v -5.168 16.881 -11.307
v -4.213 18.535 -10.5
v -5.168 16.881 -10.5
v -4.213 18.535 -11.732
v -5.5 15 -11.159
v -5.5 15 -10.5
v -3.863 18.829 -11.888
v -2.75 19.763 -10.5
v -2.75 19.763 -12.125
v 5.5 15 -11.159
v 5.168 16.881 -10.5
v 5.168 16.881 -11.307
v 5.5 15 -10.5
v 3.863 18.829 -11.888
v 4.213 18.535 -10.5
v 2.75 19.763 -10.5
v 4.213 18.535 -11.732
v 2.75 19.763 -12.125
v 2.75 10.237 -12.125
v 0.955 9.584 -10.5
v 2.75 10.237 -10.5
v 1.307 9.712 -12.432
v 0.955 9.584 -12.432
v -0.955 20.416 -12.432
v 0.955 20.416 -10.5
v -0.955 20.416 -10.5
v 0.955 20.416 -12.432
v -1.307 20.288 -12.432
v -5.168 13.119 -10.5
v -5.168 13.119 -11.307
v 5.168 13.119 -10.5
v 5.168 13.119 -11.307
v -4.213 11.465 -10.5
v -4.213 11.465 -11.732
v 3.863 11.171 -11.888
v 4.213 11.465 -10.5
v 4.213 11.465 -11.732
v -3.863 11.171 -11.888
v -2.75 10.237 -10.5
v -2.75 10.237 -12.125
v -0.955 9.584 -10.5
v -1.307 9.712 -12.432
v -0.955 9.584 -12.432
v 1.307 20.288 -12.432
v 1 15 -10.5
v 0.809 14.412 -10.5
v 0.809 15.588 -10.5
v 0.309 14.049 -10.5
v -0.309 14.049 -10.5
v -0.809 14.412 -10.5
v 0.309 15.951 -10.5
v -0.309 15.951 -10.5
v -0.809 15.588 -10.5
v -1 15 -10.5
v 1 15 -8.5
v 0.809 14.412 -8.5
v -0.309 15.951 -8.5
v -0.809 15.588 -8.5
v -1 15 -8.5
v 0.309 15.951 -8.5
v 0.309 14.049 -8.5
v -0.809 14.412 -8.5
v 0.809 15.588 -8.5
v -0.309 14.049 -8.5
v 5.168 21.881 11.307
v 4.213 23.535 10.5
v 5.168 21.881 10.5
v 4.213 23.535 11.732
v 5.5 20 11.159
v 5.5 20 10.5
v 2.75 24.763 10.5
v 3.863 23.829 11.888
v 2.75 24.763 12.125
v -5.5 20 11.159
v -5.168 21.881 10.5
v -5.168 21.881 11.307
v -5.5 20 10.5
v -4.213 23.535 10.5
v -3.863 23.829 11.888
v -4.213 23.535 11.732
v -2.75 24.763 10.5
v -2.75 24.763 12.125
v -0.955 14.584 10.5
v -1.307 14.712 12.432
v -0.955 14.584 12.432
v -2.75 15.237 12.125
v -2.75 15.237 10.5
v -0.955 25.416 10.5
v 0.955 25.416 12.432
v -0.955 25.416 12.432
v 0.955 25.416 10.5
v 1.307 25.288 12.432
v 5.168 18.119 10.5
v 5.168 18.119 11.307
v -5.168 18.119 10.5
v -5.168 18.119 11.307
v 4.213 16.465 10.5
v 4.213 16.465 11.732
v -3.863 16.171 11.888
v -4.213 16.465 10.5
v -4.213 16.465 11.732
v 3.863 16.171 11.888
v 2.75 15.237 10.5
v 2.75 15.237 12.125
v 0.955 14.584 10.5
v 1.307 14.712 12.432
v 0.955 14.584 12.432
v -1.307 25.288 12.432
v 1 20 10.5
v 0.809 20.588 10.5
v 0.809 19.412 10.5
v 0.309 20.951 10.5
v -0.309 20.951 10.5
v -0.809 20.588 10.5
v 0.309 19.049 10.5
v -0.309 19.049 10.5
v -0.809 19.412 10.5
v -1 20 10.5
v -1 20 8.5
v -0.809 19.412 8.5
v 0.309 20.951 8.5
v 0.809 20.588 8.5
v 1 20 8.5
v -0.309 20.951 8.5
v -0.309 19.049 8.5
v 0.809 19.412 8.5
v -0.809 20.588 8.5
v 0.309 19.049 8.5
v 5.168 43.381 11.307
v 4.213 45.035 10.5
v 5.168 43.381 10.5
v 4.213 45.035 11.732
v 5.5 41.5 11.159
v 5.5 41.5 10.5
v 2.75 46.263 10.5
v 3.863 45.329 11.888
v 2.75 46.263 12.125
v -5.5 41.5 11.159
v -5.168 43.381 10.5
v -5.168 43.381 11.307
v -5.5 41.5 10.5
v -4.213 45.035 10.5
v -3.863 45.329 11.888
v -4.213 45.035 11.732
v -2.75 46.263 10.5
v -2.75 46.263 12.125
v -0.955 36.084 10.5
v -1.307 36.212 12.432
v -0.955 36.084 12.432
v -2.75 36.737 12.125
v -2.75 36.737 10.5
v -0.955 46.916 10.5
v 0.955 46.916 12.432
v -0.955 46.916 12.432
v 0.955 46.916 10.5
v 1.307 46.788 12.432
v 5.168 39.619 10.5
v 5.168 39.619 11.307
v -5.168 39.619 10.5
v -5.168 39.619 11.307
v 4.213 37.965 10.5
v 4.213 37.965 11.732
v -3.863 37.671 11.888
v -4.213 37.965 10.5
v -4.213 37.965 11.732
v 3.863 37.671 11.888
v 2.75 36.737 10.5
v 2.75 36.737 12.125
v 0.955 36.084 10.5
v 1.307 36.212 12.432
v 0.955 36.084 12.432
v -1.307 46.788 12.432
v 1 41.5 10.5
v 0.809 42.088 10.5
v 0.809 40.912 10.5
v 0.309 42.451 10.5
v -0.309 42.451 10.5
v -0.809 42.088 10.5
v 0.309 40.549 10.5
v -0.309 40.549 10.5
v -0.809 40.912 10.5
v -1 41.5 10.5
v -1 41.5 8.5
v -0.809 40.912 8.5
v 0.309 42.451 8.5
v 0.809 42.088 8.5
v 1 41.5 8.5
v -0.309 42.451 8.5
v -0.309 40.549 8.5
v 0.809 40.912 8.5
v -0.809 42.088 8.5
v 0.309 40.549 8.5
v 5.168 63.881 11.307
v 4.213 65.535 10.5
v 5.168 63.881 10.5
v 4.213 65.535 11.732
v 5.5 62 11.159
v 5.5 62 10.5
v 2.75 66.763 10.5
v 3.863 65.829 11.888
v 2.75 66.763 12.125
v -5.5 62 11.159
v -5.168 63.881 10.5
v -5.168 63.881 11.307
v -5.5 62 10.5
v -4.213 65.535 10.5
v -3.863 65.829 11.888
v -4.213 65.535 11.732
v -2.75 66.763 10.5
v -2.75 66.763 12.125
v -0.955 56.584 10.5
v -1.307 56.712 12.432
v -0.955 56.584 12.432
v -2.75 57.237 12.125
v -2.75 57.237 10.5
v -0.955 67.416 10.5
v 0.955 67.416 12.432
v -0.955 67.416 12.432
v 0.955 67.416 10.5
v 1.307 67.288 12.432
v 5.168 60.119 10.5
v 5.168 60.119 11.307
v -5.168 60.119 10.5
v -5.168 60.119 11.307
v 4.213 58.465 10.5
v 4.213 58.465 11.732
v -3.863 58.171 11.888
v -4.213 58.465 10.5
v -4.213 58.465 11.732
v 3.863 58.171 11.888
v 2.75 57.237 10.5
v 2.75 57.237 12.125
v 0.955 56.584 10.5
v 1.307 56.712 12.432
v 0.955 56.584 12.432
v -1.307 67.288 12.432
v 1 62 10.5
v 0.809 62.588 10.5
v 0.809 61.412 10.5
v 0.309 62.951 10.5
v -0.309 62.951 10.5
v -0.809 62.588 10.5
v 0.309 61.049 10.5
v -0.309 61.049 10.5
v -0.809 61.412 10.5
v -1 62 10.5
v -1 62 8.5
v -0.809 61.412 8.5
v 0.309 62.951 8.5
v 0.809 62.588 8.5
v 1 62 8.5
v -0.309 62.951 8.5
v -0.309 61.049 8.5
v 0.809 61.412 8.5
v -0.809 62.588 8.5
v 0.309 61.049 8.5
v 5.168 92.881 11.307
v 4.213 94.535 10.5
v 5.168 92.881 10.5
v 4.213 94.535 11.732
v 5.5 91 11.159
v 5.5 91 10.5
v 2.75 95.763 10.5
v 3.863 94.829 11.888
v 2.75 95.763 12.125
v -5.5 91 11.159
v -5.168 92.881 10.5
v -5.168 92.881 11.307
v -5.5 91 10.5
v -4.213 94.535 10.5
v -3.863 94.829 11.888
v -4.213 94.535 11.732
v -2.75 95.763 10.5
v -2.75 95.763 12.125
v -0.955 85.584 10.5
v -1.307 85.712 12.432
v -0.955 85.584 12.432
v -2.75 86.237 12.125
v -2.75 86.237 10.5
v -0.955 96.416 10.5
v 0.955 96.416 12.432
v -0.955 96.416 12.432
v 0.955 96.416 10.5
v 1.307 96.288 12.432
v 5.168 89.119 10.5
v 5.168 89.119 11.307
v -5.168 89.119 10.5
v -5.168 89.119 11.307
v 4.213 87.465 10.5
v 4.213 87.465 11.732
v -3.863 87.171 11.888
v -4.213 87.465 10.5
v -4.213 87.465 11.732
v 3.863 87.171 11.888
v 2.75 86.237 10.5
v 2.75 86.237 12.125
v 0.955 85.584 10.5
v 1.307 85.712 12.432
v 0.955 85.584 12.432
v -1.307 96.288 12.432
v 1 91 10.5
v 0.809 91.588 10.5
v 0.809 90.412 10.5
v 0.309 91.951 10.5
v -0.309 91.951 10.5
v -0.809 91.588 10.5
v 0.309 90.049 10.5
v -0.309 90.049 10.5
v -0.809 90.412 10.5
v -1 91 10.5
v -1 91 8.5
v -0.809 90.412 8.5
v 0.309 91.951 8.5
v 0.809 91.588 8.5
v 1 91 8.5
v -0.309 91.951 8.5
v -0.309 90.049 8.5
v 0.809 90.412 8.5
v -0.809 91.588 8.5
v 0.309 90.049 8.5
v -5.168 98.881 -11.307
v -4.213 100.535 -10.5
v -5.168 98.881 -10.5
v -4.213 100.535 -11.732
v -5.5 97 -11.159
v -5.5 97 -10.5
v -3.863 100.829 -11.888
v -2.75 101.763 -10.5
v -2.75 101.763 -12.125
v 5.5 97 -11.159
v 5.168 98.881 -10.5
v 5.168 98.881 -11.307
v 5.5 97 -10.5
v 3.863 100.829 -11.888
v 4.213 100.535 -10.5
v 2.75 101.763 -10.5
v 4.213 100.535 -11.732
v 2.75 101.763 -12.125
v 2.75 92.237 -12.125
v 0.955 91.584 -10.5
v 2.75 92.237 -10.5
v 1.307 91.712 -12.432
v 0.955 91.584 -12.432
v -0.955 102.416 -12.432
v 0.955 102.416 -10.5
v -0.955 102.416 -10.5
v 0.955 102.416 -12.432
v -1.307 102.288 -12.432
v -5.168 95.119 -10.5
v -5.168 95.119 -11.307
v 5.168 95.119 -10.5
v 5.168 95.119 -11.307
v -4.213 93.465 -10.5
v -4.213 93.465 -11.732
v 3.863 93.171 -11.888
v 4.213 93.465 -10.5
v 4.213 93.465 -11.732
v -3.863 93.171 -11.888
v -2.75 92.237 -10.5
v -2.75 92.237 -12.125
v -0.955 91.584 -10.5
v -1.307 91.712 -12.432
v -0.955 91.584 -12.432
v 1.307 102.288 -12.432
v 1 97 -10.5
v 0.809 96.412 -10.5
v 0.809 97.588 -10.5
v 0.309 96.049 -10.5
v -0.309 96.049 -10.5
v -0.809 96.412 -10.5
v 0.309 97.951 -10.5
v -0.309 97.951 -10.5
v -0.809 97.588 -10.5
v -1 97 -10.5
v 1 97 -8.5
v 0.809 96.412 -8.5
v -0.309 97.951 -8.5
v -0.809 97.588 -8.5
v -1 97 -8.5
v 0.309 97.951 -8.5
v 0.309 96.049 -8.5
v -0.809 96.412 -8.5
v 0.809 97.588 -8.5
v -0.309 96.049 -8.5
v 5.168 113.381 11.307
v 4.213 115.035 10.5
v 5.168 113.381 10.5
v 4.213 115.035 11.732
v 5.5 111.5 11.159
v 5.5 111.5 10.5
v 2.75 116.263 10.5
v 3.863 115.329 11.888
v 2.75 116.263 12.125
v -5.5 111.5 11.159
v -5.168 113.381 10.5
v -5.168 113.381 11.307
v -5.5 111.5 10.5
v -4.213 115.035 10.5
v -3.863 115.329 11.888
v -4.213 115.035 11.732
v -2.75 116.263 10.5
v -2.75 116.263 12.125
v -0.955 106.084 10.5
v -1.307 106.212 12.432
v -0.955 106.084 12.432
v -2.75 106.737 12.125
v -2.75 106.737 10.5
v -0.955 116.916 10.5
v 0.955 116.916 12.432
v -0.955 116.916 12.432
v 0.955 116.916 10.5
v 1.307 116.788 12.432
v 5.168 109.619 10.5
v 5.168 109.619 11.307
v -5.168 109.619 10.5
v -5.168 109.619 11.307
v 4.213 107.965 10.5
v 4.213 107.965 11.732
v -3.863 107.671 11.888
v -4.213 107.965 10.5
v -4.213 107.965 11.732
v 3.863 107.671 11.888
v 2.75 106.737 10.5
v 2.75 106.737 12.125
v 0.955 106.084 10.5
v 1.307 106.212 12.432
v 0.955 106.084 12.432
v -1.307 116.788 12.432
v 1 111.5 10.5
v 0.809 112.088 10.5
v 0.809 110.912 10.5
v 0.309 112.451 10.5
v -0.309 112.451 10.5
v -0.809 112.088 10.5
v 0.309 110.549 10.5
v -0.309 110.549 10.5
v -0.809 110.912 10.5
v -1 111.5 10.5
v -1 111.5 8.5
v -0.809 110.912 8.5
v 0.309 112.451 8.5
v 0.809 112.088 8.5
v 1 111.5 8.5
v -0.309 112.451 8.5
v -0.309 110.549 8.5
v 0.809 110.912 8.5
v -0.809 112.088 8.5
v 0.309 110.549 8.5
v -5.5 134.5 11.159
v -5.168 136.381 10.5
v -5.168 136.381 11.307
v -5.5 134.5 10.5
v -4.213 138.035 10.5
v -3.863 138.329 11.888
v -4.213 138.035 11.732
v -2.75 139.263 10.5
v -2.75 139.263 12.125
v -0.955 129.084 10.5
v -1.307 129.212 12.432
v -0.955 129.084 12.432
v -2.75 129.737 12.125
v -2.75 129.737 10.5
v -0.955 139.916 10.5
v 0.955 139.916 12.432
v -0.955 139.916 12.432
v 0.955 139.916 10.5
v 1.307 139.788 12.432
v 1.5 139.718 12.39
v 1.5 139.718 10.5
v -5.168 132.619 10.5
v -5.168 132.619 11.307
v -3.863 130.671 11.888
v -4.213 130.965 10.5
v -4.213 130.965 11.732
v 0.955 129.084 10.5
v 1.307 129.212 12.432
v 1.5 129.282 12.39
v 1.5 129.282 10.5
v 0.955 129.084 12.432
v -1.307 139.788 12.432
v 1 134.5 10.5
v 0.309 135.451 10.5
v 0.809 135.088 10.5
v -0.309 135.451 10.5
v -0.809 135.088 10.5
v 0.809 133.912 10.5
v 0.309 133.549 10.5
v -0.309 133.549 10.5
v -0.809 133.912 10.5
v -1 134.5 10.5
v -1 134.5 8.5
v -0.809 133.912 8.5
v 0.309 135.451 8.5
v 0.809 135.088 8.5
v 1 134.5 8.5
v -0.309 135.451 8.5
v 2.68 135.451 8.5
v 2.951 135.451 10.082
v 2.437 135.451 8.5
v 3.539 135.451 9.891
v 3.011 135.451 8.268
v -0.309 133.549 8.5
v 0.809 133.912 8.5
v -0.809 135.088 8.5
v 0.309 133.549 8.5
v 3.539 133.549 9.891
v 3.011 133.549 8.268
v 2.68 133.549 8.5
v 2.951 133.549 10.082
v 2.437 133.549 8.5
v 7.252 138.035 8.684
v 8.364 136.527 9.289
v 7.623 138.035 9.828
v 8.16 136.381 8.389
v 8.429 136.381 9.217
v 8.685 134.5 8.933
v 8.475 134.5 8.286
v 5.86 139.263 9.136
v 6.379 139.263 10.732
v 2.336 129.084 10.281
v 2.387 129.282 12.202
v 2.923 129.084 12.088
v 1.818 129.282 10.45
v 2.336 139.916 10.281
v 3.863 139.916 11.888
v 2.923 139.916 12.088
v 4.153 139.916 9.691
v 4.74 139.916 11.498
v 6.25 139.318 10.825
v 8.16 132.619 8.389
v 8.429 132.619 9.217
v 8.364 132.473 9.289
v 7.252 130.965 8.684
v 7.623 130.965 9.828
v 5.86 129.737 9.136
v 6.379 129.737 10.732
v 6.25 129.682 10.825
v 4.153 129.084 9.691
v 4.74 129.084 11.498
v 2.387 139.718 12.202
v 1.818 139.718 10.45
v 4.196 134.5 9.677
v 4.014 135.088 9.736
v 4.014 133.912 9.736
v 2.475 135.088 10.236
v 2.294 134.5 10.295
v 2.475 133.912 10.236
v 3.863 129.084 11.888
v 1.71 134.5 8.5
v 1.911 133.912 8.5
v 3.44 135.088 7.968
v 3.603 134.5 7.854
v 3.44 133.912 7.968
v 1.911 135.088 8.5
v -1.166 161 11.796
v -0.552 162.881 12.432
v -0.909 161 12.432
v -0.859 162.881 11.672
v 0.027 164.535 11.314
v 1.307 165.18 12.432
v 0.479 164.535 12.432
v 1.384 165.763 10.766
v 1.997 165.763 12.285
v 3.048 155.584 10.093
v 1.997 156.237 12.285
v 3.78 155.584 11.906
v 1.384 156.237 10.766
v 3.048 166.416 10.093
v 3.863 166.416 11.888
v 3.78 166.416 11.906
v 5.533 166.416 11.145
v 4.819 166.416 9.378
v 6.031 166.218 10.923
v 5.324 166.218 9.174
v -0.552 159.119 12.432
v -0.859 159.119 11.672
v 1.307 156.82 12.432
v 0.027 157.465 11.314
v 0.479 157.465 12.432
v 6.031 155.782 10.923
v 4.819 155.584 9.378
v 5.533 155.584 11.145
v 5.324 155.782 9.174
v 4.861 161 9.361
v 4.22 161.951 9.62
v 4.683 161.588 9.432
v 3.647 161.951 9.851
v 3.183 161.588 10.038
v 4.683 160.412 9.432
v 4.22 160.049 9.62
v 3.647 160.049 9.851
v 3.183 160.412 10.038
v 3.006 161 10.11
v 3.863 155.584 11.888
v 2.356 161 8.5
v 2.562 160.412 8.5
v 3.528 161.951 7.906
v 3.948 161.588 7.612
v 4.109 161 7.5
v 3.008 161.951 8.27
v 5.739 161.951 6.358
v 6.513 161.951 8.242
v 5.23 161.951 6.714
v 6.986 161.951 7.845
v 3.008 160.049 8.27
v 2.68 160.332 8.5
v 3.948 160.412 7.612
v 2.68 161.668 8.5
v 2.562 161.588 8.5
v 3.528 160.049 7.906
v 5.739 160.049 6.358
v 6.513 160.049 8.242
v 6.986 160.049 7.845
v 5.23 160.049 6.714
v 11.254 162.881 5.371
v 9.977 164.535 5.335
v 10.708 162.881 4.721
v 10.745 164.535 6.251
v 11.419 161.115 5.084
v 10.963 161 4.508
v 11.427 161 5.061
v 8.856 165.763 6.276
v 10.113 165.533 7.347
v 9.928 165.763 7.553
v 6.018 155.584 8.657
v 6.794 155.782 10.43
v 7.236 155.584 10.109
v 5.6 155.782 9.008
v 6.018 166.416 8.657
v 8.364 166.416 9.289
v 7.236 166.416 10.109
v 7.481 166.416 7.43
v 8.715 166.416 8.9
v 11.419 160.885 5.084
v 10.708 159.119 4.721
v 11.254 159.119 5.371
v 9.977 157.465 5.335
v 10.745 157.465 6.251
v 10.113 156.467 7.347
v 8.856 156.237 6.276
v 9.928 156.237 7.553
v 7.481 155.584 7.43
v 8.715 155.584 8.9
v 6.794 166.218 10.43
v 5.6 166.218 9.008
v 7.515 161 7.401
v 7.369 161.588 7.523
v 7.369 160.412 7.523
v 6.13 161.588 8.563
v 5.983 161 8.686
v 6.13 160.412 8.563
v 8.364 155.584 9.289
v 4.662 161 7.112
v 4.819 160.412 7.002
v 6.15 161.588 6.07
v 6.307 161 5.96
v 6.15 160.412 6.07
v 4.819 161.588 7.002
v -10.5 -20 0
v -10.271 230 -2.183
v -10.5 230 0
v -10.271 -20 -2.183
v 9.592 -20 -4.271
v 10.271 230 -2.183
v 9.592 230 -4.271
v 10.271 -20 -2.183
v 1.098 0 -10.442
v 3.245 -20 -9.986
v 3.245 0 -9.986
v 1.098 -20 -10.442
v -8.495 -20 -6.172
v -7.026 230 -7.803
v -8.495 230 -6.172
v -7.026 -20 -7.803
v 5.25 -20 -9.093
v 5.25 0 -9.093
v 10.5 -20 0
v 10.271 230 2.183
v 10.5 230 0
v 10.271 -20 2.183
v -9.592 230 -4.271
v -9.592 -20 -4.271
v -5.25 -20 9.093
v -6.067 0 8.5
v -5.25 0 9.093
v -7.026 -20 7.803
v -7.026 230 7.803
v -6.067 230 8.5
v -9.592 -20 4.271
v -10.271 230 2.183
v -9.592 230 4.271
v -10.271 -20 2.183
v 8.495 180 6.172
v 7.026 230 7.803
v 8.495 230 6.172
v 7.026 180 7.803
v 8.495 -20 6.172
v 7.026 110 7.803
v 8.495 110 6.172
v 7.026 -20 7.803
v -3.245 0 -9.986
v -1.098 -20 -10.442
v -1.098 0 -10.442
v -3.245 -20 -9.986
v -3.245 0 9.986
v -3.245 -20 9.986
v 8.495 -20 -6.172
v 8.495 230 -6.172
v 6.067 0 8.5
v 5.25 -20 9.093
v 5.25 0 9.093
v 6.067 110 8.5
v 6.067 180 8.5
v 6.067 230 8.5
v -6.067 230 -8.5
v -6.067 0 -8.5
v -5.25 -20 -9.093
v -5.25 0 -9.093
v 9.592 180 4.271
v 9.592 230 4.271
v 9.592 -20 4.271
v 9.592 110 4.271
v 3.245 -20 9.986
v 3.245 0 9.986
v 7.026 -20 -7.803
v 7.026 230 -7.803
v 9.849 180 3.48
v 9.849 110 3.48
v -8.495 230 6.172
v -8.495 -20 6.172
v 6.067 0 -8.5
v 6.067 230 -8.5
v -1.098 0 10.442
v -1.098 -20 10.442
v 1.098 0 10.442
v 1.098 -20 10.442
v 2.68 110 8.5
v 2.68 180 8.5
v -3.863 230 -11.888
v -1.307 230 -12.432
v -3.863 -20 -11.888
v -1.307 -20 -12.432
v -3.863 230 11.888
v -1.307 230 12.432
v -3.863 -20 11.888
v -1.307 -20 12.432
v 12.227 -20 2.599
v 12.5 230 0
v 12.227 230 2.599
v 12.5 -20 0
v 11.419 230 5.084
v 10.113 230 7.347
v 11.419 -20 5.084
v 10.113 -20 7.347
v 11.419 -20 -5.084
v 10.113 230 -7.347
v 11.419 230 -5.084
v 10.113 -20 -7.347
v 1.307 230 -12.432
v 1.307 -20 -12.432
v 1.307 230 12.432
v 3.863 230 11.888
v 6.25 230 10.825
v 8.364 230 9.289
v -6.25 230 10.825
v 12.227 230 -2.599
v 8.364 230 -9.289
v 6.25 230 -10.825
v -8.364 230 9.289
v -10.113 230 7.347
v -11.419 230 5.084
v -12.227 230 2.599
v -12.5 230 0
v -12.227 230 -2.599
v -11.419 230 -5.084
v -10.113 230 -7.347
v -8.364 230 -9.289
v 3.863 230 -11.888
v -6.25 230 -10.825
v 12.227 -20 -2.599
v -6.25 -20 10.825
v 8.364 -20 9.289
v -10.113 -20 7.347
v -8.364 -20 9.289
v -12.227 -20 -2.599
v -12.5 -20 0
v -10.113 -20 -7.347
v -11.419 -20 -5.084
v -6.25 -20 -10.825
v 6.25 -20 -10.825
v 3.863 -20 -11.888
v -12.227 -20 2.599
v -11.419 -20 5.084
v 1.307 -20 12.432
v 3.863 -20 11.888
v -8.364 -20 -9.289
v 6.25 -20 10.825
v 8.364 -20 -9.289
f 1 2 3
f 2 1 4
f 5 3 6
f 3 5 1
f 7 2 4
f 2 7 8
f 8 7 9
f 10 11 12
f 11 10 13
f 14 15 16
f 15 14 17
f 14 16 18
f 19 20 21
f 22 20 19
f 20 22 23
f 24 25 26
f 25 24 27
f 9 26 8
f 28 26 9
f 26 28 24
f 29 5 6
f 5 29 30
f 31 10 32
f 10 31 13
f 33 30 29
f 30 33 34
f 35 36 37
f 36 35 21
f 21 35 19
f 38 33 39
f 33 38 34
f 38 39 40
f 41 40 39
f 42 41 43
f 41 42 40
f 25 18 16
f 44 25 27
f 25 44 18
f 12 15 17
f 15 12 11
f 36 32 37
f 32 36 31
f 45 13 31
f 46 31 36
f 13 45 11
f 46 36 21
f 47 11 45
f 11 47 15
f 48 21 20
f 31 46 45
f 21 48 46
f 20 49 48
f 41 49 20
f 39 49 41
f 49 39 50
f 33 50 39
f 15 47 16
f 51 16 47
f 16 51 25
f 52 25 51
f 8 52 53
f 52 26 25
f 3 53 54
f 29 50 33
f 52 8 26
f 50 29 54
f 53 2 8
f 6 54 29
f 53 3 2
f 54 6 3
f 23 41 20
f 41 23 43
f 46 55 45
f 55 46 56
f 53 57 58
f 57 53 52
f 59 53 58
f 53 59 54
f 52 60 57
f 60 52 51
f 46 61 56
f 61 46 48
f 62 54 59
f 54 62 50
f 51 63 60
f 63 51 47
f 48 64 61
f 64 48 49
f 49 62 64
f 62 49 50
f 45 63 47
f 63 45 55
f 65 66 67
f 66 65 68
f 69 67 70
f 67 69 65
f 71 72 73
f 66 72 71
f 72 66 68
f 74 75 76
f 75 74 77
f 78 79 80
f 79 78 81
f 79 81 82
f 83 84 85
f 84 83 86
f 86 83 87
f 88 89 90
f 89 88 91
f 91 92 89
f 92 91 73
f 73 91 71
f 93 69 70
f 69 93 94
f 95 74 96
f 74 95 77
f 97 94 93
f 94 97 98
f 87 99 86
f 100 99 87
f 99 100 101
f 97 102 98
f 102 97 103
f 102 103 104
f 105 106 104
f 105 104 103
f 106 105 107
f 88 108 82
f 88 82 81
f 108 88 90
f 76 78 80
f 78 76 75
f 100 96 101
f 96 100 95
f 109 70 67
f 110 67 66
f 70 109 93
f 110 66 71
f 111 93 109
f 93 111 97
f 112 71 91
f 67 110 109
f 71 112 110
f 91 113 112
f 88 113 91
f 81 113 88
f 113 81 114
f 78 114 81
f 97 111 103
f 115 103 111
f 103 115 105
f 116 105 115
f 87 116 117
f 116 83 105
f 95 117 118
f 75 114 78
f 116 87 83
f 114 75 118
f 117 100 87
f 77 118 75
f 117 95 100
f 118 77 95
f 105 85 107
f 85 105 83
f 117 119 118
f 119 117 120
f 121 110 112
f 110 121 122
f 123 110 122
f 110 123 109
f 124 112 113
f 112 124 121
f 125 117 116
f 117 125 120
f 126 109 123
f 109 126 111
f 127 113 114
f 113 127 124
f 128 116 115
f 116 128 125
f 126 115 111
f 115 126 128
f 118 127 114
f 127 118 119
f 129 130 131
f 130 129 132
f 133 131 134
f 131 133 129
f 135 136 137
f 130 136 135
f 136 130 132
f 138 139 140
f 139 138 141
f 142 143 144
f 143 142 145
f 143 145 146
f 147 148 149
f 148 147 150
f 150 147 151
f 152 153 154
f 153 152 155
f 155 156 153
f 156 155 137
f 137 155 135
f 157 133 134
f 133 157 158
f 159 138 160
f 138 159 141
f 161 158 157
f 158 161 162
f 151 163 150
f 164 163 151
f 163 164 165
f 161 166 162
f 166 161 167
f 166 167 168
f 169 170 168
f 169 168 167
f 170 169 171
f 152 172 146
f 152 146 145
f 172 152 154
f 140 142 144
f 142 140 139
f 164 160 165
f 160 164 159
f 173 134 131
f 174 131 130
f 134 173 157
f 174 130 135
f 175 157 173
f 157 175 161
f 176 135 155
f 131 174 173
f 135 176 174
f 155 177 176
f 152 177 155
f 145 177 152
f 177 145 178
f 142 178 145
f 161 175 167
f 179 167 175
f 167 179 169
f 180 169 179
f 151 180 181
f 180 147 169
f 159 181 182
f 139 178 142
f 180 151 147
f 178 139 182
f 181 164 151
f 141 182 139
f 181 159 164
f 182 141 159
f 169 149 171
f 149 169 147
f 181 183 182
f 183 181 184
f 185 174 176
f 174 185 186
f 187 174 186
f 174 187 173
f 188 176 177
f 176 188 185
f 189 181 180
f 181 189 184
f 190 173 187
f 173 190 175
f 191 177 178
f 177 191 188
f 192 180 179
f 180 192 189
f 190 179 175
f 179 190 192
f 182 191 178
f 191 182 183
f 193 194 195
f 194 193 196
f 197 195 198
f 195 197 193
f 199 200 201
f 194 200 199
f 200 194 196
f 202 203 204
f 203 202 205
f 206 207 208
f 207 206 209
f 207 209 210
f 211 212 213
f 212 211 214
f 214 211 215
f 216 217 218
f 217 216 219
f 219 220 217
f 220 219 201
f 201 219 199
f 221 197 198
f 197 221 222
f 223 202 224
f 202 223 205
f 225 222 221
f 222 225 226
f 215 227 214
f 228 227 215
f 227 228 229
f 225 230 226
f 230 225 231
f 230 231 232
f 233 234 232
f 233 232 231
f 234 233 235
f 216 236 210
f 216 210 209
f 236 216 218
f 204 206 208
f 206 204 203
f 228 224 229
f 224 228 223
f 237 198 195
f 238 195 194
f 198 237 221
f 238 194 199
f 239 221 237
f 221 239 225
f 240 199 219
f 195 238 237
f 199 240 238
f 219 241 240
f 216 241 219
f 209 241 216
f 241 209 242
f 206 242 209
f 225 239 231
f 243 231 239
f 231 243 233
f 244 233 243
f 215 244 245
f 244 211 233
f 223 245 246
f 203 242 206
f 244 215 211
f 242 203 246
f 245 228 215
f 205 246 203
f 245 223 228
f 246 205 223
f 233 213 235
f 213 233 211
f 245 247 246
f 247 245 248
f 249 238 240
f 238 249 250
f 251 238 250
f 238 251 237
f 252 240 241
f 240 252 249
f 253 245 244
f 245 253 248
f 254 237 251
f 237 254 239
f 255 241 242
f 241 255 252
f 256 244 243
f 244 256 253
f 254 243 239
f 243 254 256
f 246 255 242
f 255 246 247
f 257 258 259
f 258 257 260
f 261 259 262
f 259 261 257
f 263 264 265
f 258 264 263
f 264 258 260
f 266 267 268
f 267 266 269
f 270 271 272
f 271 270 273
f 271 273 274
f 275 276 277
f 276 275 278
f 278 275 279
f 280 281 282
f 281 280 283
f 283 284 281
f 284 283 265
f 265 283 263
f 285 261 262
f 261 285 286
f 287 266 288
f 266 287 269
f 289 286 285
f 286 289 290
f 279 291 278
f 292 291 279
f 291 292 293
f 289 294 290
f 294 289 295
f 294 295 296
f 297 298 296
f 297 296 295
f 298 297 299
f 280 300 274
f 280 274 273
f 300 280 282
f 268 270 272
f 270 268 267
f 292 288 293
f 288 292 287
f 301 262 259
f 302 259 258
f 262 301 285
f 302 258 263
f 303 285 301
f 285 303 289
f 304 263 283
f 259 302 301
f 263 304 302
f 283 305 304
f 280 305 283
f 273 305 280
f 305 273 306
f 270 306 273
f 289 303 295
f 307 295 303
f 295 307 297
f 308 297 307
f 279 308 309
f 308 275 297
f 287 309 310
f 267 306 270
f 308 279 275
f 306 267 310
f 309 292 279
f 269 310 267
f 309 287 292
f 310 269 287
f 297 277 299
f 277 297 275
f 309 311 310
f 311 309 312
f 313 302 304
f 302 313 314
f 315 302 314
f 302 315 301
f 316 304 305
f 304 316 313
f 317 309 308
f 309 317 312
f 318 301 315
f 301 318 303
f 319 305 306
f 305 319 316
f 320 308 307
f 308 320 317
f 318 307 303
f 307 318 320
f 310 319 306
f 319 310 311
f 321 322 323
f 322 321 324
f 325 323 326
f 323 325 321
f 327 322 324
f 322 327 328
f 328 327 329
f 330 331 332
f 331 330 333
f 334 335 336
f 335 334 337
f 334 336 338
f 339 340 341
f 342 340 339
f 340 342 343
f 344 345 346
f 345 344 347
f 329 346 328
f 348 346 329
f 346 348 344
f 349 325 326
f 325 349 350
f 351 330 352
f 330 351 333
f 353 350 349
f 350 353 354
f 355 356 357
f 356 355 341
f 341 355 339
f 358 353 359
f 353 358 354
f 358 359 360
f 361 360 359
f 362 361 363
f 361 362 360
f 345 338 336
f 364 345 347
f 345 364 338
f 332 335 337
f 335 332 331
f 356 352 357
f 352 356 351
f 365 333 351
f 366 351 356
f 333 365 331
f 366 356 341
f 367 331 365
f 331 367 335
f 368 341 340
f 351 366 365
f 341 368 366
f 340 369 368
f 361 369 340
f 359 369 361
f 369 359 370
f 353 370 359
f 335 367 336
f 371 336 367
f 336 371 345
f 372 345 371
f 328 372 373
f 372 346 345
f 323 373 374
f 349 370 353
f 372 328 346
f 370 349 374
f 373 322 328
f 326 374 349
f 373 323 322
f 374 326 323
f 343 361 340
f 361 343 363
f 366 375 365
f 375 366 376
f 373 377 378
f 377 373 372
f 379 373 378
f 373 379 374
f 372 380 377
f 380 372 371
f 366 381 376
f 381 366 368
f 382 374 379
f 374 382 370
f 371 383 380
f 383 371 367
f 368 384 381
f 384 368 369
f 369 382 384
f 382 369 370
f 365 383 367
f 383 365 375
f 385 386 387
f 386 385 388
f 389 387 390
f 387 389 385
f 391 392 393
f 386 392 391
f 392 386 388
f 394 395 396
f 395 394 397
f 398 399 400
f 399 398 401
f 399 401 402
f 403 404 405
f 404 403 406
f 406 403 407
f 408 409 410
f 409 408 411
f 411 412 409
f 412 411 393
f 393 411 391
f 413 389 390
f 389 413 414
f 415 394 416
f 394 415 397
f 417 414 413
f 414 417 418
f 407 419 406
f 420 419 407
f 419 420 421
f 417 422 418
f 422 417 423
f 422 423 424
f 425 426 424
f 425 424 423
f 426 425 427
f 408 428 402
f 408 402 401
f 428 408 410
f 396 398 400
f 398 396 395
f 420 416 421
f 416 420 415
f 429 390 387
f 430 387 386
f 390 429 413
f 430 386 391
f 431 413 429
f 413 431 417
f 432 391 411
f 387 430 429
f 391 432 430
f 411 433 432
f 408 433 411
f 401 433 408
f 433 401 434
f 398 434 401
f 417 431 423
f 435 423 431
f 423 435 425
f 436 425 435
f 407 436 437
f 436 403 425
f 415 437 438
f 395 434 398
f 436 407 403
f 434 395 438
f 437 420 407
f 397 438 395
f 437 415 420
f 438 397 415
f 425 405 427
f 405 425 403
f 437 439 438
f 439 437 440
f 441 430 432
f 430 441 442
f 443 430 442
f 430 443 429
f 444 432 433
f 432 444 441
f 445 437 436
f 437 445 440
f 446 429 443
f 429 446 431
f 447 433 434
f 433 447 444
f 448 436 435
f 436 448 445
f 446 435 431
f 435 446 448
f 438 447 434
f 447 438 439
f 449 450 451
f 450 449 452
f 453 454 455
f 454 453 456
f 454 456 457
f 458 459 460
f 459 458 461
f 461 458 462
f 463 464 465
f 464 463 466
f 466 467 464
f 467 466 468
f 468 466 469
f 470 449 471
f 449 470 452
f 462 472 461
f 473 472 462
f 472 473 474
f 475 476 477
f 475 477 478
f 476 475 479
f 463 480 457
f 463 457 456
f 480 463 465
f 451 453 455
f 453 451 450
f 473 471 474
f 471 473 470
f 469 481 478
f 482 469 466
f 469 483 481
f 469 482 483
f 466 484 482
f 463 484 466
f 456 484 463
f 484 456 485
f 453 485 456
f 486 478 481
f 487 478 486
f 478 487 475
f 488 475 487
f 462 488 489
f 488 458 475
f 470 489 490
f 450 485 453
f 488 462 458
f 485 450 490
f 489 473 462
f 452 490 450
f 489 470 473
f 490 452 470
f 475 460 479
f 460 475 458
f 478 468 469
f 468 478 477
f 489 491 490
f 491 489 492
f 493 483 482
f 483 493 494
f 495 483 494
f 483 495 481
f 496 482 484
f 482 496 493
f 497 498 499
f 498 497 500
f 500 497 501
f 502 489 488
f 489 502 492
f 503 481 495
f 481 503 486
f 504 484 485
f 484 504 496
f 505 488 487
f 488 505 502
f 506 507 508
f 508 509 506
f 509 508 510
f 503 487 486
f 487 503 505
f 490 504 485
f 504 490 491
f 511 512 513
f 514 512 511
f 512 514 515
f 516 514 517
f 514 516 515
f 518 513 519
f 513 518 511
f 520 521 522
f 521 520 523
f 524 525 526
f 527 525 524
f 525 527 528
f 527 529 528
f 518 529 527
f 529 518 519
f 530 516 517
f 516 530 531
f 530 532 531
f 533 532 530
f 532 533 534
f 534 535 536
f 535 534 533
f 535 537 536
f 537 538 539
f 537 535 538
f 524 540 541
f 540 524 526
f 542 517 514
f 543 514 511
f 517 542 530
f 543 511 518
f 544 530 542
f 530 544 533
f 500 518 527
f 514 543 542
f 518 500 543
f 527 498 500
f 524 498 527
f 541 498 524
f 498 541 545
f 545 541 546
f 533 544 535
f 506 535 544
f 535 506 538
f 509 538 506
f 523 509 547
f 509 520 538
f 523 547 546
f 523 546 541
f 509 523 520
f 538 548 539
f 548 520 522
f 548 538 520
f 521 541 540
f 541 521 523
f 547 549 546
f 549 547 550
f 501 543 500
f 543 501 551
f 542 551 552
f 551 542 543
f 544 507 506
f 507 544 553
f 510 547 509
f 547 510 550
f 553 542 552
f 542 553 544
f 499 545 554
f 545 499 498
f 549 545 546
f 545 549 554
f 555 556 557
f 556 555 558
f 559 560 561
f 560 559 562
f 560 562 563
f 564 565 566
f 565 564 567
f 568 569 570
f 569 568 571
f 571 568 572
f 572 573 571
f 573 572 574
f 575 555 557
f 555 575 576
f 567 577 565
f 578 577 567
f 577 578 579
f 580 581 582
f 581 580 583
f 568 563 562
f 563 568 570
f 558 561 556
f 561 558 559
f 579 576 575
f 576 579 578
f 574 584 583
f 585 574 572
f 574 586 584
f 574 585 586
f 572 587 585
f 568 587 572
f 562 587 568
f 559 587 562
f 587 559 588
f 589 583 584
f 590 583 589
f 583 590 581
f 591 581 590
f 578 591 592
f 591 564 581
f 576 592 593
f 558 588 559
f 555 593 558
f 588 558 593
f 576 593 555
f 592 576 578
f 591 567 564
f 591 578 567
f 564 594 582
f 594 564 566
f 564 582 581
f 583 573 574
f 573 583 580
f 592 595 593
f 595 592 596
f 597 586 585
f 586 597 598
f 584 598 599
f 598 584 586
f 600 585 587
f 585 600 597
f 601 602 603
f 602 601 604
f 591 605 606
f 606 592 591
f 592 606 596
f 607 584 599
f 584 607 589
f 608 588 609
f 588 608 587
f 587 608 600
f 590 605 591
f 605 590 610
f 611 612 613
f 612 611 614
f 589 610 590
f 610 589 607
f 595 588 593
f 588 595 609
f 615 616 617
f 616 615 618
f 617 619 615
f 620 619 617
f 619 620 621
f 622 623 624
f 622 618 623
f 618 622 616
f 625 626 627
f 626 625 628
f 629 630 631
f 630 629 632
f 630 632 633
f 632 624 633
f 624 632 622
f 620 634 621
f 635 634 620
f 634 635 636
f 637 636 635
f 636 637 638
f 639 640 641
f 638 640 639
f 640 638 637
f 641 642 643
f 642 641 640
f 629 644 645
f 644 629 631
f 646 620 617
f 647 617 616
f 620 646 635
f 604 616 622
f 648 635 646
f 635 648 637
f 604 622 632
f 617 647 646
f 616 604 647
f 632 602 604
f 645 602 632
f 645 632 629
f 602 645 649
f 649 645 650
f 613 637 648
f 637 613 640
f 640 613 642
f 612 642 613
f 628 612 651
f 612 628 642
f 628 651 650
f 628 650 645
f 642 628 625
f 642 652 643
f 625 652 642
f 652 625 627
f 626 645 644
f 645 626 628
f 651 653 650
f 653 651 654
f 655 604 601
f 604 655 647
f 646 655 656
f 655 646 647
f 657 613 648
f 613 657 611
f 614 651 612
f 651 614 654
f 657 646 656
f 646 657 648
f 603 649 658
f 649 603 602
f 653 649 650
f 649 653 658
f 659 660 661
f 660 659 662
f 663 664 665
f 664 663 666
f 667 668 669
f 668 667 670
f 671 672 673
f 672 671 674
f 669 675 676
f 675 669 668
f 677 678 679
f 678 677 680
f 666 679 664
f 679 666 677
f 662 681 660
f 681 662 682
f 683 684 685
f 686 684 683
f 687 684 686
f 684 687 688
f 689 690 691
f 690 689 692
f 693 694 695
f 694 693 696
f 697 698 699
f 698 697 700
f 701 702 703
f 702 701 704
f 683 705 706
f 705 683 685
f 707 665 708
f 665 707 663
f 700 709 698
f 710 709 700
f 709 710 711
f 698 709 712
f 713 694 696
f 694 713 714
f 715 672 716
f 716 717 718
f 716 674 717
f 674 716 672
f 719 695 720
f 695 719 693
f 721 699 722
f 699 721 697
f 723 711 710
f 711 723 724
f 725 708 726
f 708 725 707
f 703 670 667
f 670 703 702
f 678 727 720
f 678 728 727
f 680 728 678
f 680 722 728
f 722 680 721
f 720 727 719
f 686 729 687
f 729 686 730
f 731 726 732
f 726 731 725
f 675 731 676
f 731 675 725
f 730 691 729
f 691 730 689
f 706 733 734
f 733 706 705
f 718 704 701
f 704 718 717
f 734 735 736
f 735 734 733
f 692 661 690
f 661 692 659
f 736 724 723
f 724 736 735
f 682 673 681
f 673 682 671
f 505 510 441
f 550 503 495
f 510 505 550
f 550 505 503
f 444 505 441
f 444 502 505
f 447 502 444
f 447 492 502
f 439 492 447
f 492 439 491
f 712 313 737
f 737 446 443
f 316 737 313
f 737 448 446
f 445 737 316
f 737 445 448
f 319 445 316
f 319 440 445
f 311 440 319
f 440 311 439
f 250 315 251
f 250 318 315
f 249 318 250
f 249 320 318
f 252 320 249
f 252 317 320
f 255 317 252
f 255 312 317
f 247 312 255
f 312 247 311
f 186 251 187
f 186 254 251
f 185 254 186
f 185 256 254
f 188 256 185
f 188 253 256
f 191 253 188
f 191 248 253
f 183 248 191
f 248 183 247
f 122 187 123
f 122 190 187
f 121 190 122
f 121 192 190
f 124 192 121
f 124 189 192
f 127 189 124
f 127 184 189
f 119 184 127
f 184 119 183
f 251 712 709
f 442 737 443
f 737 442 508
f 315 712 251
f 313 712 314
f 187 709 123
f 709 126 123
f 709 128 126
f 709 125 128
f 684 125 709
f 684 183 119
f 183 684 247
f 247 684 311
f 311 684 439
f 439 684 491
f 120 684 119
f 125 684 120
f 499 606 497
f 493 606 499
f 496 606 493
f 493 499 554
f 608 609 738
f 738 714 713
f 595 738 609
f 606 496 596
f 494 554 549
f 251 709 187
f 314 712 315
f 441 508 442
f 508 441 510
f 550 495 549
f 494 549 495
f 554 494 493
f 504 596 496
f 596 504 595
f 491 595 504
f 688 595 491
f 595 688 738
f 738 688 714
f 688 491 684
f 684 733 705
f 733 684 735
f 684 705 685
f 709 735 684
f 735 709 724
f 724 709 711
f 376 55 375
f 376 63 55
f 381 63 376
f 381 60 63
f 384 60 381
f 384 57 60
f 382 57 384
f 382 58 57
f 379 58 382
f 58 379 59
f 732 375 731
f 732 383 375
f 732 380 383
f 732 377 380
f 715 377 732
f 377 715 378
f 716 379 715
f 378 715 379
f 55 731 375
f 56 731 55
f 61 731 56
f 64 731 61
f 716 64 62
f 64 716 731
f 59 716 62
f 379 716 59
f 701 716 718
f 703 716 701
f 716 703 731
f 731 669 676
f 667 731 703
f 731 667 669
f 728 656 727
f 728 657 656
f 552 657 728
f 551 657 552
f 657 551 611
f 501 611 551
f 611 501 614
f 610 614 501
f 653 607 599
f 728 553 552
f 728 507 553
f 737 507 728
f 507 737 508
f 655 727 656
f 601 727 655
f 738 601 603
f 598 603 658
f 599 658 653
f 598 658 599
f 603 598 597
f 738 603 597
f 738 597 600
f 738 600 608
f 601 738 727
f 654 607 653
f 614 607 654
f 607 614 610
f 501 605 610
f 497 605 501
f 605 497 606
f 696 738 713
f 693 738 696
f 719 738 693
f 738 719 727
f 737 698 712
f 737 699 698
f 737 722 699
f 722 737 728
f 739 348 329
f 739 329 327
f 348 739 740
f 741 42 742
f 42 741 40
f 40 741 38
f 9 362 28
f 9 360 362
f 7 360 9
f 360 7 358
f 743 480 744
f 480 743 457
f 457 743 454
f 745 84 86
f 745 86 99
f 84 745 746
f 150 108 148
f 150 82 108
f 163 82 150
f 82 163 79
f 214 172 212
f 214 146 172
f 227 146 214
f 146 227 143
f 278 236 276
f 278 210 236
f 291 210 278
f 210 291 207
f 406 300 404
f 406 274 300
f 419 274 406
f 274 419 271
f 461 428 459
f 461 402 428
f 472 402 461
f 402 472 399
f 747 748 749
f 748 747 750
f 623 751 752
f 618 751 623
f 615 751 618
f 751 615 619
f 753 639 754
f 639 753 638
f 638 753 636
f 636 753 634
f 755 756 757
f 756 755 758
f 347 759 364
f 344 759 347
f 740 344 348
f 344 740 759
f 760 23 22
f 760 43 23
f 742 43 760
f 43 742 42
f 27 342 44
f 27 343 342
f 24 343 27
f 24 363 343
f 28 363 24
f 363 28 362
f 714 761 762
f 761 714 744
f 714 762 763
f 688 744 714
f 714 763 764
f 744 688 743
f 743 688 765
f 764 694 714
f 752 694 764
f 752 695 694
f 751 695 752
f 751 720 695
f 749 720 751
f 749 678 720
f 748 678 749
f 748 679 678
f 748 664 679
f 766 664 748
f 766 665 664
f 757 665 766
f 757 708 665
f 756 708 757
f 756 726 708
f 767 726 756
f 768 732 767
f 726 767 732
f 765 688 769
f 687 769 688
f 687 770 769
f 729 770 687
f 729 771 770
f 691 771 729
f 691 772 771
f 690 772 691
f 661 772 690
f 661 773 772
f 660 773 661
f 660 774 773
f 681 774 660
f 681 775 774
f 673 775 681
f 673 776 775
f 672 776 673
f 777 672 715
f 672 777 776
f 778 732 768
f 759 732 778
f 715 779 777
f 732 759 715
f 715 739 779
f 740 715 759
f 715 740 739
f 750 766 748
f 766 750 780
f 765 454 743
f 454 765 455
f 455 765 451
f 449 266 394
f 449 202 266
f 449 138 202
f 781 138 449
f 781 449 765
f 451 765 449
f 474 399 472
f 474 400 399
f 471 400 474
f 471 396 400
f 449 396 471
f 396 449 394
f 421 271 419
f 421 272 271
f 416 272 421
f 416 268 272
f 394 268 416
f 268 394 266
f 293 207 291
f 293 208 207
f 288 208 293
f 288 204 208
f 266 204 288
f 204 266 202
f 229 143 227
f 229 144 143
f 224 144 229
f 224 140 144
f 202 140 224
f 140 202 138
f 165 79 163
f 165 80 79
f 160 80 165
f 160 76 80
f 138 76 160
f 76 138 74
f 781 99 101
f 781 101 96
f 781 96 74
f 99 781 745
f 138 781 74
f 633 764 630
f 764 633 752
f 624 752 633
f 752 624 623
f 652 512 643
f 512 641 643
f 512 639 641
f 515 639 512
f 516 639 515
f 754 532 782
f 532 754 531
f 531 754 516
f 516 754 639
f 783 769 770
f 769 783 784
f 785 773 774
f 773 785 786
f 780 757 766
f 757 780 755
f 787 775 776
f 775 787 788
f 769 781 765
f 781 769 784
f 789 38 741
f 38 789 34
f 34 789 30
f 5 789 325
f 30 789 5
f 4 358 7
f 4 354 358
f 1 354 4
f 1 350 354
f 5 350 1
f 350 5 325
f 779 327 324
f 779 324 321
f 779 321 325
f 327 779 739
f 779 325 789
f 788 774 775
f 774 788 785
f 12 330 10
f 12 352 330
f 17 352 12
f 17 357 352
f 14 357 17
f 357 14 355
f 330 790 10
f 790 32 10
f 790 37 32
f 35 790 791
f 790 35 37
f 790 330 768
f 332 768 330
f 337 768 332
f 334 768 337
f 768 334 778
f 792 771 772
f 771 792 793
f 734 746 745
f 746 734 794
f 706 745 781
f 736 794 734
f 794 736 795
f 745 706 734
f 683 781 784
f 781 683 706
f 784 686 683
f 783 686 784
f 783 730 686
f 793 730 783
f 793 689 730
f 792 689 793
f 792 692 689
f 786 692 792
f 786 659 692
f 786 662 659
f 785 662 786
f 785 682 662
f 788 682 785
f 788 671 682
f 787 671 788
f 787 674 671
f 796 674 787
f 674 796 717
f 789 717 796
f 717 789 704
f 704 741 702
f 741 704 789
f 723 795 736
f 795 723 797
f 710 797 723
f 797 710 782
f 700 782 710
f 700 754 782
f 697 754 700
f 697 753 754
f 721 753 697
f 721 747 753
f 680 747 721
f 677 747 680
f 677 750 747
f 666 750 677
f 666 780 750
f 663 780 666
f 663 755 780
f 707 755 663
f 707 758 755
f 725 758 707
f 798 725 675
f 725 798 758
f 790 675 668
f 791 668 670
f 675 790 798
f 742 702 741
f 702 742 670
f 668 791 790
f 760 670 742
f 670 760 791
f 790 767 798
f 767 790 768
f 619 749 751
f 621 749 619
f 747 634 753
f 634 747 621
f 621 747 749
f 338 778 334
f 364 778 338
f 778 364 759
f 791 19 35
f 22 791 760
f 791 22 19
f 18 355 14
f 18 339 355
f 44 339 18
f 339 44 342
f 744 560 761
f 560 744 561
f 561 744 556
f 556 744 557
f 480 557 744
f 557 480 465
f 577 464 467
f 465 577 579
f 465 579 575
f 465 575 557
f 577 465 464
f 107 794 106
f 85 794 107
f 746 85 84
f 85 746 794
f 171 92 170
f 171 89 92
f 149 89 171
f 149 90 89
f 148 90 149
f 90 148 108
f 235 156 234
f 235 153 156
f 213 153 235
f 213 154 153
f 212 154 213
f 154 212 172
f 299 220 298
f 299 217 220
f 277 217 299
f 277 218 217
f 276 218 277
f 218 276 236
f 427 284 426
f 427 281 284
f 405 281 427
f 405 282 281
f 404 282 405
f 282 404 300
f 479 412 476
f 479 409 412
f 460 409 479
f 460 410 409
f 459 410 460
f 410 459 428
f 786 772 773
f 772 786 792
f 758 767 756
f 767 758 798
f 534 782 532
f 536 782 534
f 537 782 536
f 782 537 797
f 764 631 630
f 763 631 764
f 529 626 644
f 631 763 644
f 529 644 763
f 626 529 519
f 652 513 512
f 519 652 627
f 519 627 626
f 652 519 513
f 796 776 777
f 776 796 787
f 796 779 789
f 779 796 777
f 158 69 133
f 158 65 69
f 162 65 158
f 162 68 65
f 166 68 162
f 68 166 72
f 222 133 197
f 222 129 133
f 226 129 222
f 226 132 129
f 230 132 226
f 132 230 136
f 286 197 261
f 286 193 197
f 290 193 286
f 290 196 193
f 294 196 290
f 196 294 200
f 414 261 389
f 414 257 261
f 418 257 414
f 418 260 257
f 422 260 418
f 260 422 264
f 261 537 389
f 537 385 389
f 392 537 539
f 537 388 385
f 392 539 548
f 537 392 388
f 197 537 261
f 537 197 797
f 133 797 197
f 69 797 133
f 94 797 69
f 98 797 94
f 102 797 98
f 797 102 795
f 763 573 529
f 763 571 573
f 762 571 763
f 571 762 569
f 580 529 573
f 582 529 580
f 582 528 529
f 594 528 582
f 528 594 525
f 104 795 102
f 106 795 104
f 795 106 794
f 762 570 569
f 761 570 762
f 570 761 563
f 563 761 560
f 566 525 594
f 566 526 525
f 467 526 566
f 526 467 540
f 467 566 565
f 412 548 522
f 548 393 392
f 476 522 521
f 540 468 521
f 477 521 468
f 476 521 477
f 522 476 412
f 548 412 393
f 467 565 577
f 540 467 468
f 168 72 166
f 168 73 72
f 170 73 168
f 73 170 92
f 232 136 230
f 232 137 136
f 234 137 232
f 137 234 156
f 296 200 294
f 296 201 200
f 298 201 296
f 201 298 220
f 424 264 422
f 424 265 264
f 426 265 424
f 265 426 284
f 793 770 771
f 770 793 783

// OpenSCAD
// Finger Position: [[OFFSET, ANGLE, CLIP]]
// OFFSET: Distance from the start of the recorder segment (without the mouthpiece) to the center of the finger hole
// ANGLE: The rotation amount from the top of the recorder
// CLIP: The portion of the hole to cover up
FINGER_POSITION = [
    [15, 180, 0],    // 0: Left thumb
    [20, 0, 0],      // 1: Left index
    [41.5, 0, 0],    // 2: Left middle
    [62, 0, 0],      // 3: Left ring
    [91, 0, 0],      // 4: Right index
    [97, 180, 0],    // -: Right thump
    [111.5, 0, 0],   // 5: Right middle
    [134.5, 0, 7],   // 6a: Right ring
    [134.5, 18, -7], // 6b: Right ring
    [161, 22, 7],    // 7a: Right pinky
    [161, 40, -7],   // 7b: Right pinky
];

TOLLERANCE = 0.5;
SHAFT_RADIUS = 12.5;
SHAFT_DUCT_RADIUS = 10.5;
SHAFT_LENGTH = 230;
EMBOUCHURE_LENGTH = 111;
MOUTHPIECE_LENGTH = 17.5;
MOUTHPIECE_DEPTH = 60;
EMBOUCHURE_RADIUS = SHAFT_RADIUS + 2;
CONNECTION_LENGTH = 20;

FINGER_DIAMETER = 11;
STEM_DIAMETER = 2;
STEM_DEPTH = SHAFT_RADIUS;
DOME_HEIGHT = 2;
SEMI_DOME = 6;
SCREW_HOLE_DIAMETER = 2.5;

MRP121 = [20, 34, 5];
MPRLS = [18.5, 16.7, 2];
PICO = [21, 51, 3];
USB_RADIUS = 6;

translate([0, EMBOUCHURE_LENGTH - MRP121[1], 0])
mrp121();

translate([-MPRLS[0]/2, MOUTHPIECE_DEPTH, -MPRLS[1]/2])
rotate([90, 0, 0])
mprls();

translate([0, EMBOUCHURE_LENGTH + SHAFT_LENGTH - PICO[1], 0])
pico();
translate([0, EMBOUCHURE_LENGTH, 0])
color("red", alpha=0.25)
!body();

//difference(){
color("green", alpha=0.5)
embouchure();
//translate([0, 0, 0])
//cube([1000, 1000, 1000]);
//}


translate([0, EMBOUCHURE_LENGTH + SHAFT_LENGTH, 0])
endcap();

module embouchure() {
    difference() {
        translate([0, 25, 0])
        scale([1, 2, 1])
        sphere(1.25 * SHAFT_RADIUS);
        
        translate([0, -50, 0])
        cube([100, 100, 100], center=true);
        
        translate([0, 0, -MOUTHPIECE_LENGTH])
        rotate([0, 90, 0])
        cylinder(h=100, d=40, center=true);
        
        translate([0, MOUTHPIECE_LENGTH, 0])
        rotate([-90, 0, 0])
        cylinder(h=EMBOUCHURE_LENGTH, r=SCREW_HOLE_DIAMETER + TOLLERANCE);
        
        translate([-5, -0.001, 4])
        cube([10, 30, 3]);

        translate([-5, 15, 2])
        cube([10, 15, 3]);
    }
    
    difference() {
        translate([0, 30, 0])
        rotate([-90, 0, 0])
        cylinder(h=EMBOUCHURE_LENGTH - CONNECTION_LENGTH - MOUTHPIECE_LENGTH, r=EMBOUCHURE_RADIUS);
        
        translate([0, MOUTHPIECE_DEPTH - 4, 0])
        rotate([-90, 0, 0])
        cylinder(h=EMBOUCHURE_LENGTH, r=SHAFT_RADIUS + TOLLERANCE);
        
        rotate([-90, 0, 0])
        cylinder(h=EMBOUCHURE_LENGTH, r=SCREW_HOLE_DIAMETER + TOLLERANCE);
    }
}

module body() {
    difference() {
        translate([0, -CONNECTION_LENGTH, 0])
        rotate([-90, 0, 0])
        cylinder(h=SHAFT_LENGTH + CONNECTION_LENGTH, r=SHAFT_RADIUS);
        
        for (finger_pos = FINGER_POSITION) {
            distance = finger_pos[0];
            angle = finger_pos[1];
            clip = finger_pos[2];
            
            rotate([0, angle, 0])
            translate([0, distance, SHAFT_RADIUS])
            fingerHole(clip);
        }
            
        difference() {
            BODY_LENGTH = SHAFT_LENGTH + CONNECTION_LENGTH + 2;
            rotate([-90, 0, 0])
            translate([0, 0, -CONNECTION_LENGTH-1])
            cylinder(h=BODY_LENGTH, r=SHAFT_DUCT_RADIUS);
            
            // top
            translate([-25, 0, SHAFT_DUCT_RADIUS - 2])
            cube([50, BODY_LENGTH, 50]);
            
            // bottom
            translate([-25, 0, 2-SHAFT_DUCT_RADIUS-50])
            cube([50, BODY_LENGTH, 50]);
            
            rotate([0, 35, 0])
            translate([-25, 110, SHAFT_DUCT_RADIUS - 2])
            cube([50, 70, 50]);
        }
    }
}

module endcap() {
    rotate([-90, 0, 0])
    difference() {
        cylinder(h=STEM_DEPTH, r=EMBOUCHURE_RADIUS);
        translate([0, 0, -2])
        cylinder(h=STEM_DEPTH, r=SHAFT_RADIUS + TOLLERANCE);
        cylinder(h=STEM_DEPTH, r=USB_RADIUS);
    }
}

module fingerHole(clip = 0) {
    scale([1, 1, -1]) {
        difference() {
            cylinder(h=DOME_HEIGHT, d=FINGER_DIAMETER);
            if (clip != 0) {
                translate([clip, 0, 0])
                cube(FINGER_DIAMETER, center=true);
            }
        }
        cylinder(h=STEM_DEPTH, d=STEM_DIAMETER, $fn=10);
    }
}

module mrp121() {    
    translate([-MRP121[0]/2, 0, -1]) {
        color("green")
        difference() {
            cube([MRP121[0], MRP121[1], 2]);
            
            translate([2.5, 2.5, -1])
            cylinder(h=4, d=SCREW_HOLE_DIAMETER, $fn=10);
            
            translate([2.5, MRP121[1] - 2.5, -1])
            cylinder(h=4, d=SCREW_HOLE_DIAMETER, $fn=10);
        }
        
        STEMMA = [6.5, 4.5, 3];
        color("white")
        translate([MRP121[0]/2 - STEMMA[0]/2, 0, 2])
        cube(STEMMA);
        
        color("white")
        translate([MRP121[0]/2 - STEMMA[0]/2, MRP121[1] - STEMMA[1], 2])
        cube(STEMMA);
    }    
}

module mprls() {    
    color("green")
    difference() {
        cube(MPRLS);
        
        translate([2.5, 2.5, -1])
        cylinder(h=4, d=SCREW_HOLE_DIAMETER, $fn=10);
        
        translate([2.5, MPRLS[1] - 2.5, -1])
        cylinder(h=4, d=SCREW_HOLE_DIAMETER, $fn=10);
    }
    
    color("silver")
    translate([MPRLS[0]/2, MPRLS[1]/2, 0])
    cylinder(h=7.5, d=SCREW_HOLE_DIAMETER, $fn=10);
}

module pico() {    
    translate([-PICO[0]/2, 0, -1]) {
        color("green")
        difference() {
            cube([PICO[0], PICO[1], 2]);
            
            translate([5, 2.5, -1])
            cylinder(h=4, d=SCREW_HOLE_DIAMETER, $fn=10);
            
            translate([5, PICO[1] - 2.5, -1])
            cylinder(h=4, d=SCREW_HOLE_DIAMETER, $fn=10);            
            translate([PICO[0] - 5, 2.5, -1])
            cylinder(h=4, d=SCREW_HOLE_DIAMETER, $fn=10);
            
            translate([PICO[0] - 5, PICO[1] - 2.5, -1])
            cylinder(h=4, d=SCREW_HOLE_DIAMETER, $fn=10);
        }
        
        USB = [6.5, 4.5, 3];
        color("white")
        translate([PICO[0]/2 - USB[0]/2, PICO[1] - USB[1], 2])
        cube(USB);
    }
}
